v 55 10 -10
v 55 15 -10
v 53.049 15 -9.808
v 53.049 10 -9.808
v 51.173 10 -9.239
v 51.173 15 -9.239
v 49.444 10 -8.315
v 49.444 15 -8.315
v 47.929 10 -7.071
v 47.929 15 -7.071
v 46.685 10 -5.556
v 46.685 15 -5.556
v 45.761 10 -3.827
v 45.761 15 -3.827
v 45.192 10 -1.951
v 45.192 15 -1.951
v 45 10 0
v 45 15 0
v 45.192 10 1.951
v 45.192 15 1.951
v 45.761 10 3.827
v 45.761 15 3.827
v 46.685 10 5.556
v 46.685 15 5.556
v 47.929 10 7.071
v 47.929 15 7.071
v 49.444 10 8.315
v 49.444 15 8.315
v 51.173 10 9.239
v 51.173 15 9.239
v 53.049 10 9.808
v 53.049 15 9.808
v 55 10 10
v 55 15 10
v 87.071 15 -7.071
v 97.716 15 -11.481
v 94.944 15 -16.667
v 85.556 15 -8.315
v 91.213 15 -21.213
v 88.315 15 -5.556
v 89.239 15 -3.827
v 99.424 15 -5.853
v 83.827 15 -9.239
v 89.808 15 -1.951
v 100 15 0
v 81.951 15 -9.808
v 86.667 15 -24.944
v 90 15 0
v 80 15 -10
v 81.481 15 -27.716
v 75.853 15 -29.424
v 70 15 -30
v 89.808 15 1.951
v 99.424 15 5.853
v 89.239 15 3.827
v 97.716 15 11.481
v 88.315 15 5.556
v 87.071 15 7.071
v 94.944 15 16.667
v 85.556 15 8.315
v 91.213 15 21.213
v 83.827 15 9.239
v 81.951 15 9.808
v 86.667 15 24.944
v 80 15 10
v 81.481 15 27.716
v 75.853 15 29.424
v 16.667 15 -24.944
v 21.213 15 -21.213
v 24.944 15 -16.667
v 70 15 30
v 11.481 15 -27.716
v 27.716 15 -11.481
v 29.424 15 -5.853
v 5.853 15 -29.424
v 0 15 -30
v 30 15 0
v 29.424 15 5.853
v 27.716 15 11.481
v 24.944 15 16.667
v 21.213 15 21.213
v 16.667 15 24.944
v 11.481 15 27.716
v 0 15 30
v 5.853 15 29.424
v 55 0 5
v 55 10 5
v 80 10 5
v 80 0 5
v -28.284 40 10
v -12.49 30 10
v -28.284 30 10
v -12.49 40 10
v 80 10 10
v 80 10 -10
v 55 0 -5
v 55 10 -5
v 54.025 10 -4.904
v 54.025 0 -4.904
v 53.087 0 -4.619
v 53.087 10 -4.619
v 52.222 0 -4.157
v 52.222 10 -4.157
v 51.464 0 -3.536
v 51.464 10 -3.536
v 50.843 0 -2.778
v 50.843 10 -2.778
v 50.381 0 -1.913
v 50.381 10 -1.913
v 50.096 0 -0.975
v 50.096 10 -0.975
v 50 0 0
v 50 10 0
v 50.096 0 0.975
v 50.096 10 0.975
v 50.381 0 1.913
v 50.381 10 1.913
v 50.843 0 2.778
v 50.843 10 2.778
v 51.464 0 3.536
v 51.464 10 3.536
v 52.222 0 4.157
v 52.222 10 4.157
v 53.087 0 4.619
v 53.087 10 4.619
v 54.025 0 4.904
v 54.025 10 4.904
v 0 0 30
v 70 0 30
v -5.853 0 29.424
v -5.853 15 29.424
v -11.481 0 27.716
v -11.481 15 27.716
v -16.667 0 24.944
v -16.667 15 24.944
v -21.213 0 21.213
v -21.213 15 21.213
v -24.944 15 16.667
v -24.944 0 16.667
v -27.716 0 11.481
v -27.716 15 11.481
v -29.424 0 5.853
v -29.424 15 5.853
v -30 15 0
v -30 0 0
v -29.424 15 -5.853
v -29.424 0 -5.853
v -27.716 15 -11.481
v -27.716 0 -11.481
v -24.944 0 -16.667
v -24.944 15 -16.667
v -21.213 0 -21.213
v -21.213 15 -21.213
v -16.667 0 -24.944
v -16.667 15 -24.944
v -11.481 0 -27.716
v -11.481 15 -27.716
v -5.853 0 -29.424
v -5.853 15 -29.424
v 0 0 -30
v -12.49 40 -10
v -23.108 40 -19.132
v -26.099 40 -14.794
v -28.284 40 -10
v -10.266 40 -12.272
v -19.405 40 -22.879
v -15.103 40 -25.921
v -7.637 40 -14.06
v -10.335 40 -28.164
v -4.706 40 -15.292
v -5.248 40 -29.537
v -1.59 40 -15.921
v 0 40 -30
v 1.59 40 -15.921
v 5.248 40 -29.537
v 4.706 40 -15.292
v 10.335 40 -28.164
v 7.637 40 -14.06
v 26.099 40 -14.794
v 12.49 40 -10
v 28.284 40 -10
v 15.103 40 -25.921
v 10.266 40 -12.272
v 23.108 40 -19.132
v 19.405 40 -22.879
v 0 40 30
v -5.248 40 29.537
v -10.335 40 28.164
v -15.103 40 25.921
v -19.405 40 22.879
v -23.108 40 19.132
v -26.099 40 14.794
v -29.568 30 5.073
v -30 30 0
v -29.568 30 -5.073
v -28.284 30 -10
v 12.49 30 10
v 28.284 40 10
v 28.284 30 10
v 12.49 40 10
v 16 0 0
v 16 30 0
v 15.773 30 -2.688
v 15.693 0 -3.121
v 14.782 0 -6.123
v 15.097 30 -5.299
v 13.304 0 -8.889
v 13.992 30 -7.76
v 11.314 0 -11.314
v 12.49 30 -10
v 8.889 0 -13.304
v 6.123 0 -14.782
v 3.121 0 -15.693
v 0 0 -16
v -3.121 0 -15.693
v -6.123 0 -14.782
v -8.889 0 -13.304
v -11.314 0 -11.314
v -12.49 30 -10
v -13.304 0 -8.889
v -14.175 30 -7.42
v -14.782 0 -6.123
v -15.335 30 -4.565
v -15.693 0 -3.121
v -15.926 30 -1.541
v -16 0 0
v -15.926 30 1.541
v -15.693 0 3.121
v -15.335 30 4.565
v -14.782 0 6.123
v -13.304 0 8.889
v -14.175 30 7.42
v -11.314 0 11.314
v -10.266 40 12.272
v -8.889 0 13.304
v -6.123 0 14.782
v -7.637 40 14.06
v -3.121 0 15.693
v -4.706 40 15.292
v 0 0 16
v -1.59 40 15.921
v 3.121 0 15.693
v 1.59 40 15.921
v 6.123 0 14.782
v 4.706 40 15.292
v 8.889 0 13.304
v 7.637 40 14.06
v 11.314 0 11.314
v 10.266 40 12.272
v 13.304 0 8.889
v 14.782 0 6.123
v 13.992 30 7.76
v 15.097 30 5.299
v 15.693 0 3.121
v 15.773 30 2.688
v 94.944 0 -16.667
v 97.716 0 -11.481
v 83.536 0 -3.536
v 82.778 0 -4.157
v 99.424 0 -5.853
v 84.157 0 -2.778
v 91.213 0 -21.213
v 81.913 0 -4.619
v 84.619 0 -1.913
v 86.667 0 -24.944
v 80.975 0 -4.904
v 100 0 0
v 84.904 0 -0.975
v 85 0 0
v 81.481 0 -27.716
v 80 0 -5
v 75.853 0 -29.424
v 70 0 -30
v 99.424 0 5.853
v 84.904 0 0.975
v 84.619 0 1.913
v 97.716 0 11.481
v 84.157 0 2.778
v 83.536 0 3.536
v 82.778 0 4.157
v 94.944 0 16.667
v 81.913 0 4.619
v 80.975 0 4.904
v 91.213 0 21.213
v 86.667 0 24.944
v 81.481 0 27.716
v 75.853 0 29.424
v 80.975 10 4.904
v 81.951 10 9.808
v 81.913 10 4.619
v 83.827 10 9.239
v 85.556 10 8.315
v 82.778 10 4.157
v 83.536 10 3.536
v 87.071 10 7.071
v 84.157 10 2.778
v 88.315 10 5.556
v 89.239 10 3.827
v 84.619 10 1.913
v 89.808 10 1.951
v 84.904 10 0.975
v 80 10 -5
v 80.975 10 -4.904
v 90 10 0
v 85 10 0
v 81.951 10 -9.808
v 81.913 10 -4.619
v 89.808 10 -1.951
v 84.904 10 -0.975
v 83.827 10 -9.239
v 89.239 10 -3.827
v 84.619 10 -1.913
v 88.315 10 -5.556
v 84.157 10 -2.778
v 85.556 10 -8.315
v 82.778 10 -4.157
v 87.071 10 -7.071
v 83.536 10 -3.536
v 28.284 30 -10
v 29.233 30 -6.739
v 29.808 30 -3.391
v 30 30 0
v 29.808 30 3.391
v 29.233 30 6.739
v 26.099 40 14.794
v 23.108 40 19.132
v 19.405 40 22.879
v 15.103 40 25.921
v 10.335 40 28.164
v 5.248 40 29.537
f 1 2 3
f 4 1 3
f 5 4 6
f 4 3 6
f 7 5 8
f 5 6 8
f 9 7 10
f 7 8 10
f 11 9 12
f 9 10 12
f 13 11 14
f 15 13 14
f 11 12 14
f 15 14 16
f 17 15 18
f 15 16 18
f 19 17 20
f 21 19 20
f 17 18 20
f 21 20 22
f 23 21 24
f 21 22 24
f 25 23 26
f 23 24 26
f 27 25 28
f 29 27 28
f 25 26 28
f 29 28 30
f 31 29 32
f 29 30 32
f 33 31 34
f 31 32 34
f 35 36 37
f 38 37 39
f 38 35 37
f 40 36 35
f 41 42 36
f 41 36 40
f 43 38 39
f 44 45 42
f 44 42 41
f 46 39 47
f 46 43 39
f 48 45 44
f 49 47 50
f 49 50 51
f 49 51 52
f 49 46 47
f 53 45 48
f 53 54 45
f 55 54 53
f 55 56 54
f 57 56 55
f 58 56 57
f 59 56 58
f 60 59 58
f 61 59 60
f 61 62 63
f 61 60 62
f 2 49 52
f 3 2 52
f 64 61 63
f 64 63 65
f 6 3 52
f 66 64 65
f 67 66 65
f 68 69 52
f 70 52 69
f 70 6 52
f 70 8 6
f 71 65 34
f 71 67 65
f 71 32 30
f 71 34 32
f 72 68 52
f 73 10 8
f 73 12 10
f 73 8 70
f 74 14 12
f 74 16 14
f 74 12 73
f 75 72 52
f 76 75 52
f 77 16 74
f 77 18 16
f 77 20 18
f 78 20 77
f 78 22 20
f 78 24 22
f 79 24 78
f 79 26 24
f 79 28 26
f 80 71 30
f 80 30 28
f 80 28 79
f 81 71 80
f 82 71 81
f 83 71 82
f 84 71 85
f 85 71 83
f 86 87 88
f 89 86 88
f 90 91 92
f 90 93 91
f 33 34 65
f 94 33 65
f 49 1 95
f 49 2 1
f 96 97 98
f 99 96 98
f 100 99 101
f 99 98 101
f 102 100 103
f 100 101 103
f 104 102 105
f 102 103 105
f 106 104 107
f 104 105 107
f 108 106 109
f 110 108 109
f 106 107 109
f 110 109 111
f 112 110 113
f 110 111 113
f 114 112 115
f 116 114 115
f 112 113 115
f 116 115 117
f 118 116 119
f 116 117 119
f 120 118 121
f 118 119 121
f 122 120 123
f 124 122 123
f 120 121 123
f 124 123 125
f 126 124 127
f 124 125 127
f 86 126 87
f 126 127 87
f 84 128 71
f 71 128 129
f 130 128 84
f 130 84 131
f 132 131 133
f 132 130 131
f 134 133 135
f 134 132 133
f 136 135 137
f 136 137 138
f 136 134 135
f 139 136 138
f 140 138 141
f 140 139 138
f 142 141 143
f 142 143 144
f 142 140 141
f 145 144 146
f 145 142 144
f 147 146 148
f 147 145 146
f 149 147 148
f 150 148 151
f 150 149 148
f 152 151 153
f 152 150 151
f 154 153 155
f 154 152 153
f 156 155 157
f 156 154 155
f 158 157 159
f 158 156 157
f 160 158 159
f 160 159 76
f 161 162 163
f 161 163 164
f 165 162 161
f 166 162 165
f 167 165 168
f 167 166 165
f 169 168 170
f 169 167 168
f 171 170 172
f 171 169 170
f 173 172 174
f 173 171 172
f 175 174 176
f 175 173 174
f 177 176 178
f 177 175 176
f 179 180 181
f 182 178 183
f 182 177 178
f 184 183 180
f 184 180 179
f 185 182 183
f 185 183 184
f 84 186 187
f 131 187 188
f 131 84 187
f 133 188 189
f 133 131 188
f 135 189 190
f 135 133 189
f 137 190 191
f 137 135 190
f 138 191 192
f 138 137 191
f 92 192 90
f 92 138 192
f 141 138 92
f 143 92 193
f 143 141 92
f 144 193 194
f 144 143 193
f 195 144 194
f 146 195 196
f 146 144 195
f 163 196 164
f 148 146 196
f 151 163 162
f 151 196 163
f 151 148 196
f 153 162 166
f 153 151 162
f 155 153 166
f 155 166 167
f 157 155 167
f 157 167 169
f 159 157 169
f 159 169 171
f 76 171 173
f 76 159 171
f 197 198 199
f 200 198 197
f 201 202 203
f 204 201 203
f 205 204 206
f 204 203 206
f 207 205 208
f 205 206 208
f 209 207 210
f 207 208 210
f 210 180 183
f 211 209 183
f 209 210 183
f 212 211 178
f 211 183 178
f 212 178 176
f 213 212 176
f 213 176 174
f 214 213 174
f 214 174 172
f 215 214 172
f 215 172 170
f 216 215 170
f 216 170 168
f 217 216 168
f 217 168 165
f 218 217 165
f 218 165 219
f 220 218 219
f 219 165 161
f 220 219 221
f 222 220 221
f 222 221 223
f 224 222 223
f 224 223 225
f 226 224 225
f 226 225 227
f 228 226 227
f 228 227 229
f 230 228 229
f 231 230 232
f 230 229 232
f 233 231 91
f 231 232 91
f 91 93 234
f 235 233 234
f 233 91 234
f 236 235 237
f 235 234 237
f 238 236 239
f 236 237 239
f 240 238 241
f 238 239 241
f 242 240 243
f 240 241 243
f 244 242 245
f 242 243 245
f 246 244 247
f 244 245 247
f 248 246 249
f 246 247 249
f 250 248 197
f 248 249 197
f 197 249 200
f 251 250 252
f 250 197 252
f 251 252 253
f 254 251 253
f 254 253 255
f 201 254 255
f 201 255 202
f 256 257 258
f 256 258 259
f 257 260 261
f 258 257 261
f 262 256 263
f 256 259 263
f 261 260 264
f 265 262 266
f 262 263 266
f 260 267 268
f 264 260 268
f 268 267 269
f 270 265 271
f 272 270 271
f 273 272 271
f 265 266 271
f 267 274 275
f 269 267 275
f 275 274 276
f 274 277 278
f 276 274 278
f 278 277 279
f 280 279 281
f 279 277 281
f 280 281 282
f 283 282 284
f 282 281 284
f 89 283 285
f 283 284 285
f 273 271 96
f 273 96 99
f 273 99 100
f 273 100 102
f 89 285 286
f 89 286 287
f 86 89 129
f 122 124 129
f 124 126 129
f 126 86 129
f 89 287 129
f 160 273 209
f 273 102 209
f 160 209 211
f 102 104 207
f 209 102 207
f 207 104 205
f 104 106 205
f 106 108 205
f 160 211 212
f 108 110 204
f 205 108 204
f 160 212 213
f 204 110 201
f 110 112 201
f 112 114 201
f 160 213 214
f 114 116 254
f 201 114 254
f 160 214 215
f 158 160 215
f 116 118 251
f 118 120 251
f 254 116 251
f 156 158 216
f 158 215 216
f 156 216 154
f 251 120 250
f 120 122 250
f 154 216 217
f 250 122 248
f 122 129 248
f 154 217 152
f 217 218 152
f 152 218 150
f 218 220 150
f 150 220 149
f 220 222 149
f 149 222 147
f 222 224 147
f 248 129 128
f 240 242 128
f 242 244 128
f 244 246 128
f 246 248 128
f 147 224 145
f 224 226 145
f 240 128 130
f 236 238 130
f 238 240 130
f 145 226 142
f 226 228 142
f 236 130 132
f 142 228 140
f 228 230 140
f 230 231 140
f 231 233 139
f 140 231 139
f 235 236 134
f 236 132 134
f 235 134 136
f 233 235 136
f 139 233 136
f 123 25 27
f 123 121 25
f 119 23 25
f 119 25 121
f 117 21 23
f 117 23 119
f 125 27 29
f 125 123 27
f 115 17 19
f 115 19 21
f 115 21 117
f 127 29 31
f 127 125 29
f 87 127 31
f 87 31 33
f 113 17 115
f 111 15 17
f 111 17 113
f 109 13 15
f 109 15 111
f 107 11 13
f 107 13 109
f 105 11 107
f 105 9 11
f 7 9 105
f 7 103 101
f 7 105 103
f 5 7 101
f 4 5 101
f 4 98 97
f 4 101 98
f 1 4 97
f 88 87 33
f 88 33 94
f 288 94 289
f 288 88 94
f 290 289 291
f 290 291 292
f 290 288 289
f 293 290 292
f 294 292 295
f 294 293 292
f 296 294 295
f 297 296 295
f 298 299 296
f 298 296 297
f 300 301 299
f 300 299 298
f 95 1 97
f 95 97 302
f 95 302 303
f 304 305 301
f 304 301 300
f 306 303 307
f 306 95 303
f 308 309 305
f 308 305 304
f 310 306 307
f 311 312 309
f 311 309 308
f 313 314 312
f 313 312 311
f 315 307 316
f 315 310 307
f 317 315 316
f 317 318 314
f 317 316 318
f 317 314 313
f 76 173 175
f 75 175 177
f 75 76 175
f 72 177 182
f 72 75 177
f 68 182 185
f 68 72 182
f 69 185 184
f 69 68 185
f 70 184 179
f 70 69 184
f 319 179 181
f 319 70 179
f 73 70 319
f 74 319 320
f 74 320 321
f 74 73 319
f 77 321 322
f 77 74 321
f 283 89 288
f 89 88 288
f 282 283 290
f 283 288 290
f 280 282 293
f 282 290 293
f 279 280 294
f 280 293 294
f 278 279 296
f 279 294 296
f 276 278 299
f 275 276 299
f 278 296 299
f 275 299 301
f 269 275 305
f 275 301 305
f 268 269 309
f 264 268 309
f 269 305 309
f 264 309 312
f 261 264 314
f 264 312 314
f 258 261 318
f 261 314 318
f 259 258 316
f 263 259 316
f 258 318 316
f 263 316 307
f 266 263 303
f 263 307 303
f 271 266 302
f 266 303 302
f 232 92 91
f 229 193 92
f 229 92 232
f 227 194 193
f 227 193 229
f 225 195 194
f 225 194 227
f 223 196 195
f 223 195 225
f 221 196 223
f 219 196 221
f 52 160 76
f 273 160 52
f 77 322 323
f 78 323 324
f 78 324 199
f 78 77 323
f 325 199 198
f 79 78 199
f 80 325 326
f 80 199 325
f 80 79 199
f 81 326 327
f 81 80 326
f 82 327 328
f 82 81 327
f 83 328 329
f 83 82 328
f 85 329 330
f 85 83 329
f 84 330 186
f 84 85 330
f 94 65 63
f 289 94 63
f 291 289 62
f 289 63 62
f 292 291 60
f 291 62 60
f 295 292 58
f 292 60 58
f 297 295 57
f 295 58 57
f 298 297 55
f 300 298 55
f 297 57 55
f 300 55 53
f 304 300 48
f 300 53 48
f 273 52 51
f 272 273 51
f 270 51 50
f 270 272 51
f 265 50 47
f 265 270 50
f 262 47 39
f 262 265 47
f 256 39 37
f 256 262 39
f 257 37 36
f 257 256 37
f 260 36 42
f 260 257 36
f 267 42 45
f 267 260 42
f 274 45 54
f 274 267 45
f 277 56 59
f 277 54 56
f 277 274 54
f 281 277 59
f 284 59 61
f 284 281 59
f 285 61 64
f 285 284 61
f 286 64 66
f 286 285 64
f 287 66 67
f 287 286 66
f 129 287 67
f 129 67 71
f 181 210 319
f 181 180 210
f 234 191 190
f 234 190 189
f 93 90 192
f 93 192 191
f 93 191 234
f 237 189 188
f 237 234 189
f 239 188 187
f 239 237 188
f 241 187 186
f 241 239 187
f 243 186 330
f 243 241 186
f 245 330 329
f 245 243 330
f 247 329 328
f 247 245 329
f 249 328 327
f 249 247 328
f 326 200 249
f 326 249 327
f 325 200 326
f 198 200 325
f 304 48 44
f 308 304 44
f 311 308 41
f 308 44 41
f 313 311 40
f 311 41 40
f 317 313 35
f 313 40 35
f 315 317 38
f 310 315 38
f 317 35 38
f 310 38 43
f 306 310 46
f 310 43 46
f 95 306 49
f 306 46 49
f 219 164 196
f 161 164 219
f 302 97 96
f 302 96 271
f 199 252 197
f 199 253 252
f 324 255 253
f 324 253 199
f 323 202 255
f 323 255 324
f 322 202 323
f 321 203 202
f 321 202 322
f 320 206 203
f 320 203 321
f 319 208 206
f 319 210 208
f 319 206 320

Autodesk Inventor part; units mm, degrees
ref_plane "YZ Plane" through (0, 0, 0) normal (1, 0, 0) x (0, 1, 0)
ref_plane "XZ Plane" through (0, 0, 0) normal (0, 1, 0) x (-1, 0, 0)
ref_plane "XY Plane" through (0, 0, 0) normal (0, 0, 1) x (1, 0, 0)
sketch "草圖1" plane through (0, 0, 0) normal (0, 1, 0) x (-1, 0, 0)
  circle A0 centre (0, 0) radius 30
  line L0 (0, -30) -> (-70, -30)
  arc A1 (-70, 30) -> (-70, -30) centre (-70, 0) ccw
  line L1 (0, 30) -> (-70, 30)
  dimension "d0" = 70
  dimension "d1" = 30
  dimension "d2" = 60
extrude "擠出1" add sketch "草圖1" along normal blind 15
sketch "草圖2" plane through (0, 15, 0) normal (0, 1, 0) x (1, 0, 0)
  arc A0 (0, 30) -> (0, -30) centre (0, 0) ccw projected
  line L0 (0, -30) -> (70, -30) projected
  arc A1 (70, -30) -> (70, 30) centre (70, 0) ccw projected
  line L1 (70, 30) -> (0, 30) projected
  circle A2 centre (0, 0) radius 30
extrude "擠出2" add sketch "草圖2" along normal blind 25 contours A2 A0
sketch "草圖3" plane through (0, 40, 0) normal (0, 1, 0) x (1, 0, 0)
  circle A0 centre (0, 0) radius 16
  dimension "d7" = 32
extrude "擠出3" cut sketch "草圖3" against normal up to next
sketch "草圖4" plane through (0, 40, 0) normal (0, 1, 0) x (1, 0, 0)
  line L0 (-34.5334, 10) -> (33.6388, 10)
  line L1 (33.6388, 10) -> (33.6388, -10)
  line L2 (33.6388, -10) -> (-34.5334, -10)
  line L3 (-34.5334, -10) -> (-34.5334, 10)
  line L4 (-29.5296, 0) -> (41.1192, 0)
  point P0 (0, 0)
  dimension "d10" = 20
extrude "擠出4" cut sketch "草圖4" against normal blind 10
sketch "草圖5" plane through (0, 15, 0) normal (0, 1, 0) x (1, 0, 0)
  line L0 (48.3987, 0) -> (103.2063, 0)
  line L1 (55, 10) -> (80, 10)
  line L2 (55, -10) -> (80, -10)
  arc A0 (80, -10) -> (80, 10) centre (80, 0) ccw
  arc A1 (55, 10) -> (55, -10) centre (55, 0) ccw
  line L3 (0, 0) -> (0, 8.9825) construction
  dimension "d13" = 55
  dimension "d14" = 25
  dimension "d15" = 10
  dimension "d16" = 10
extrude "擠出5" cut sketch "草圖5" against normal blind 5
sketch "草圖6" plane through (0, 10, 0) normal (0, 1, 0) x (1, 0, 0)
  line L0 (55, 5) -> (80, 5)
  arc A0 (55, 5) -> (55, -5) centre (55, 0) ccw
  arc A1 (80, -5) -> (80, 5) centre (80, 0) ccw
  line L1 (55, -5) -> (80, -5)
  line L2 (0, 0) -> (0, 5.5956) construction
  line L3 (0, 0) -> (10.788, 0) construction
  line L4 (0, -30) -> (70, -30) projected
  dimension "d19" = 55
  dimension "d20" = 25
  dimension "d22" = 5
  dimension "d23" = 5
  dimension "d25" = 30
  dimension "d26" = 0
extrude "擠出6" cut sketch "草圖6" against normal blind 10
properties part number "複習一"
